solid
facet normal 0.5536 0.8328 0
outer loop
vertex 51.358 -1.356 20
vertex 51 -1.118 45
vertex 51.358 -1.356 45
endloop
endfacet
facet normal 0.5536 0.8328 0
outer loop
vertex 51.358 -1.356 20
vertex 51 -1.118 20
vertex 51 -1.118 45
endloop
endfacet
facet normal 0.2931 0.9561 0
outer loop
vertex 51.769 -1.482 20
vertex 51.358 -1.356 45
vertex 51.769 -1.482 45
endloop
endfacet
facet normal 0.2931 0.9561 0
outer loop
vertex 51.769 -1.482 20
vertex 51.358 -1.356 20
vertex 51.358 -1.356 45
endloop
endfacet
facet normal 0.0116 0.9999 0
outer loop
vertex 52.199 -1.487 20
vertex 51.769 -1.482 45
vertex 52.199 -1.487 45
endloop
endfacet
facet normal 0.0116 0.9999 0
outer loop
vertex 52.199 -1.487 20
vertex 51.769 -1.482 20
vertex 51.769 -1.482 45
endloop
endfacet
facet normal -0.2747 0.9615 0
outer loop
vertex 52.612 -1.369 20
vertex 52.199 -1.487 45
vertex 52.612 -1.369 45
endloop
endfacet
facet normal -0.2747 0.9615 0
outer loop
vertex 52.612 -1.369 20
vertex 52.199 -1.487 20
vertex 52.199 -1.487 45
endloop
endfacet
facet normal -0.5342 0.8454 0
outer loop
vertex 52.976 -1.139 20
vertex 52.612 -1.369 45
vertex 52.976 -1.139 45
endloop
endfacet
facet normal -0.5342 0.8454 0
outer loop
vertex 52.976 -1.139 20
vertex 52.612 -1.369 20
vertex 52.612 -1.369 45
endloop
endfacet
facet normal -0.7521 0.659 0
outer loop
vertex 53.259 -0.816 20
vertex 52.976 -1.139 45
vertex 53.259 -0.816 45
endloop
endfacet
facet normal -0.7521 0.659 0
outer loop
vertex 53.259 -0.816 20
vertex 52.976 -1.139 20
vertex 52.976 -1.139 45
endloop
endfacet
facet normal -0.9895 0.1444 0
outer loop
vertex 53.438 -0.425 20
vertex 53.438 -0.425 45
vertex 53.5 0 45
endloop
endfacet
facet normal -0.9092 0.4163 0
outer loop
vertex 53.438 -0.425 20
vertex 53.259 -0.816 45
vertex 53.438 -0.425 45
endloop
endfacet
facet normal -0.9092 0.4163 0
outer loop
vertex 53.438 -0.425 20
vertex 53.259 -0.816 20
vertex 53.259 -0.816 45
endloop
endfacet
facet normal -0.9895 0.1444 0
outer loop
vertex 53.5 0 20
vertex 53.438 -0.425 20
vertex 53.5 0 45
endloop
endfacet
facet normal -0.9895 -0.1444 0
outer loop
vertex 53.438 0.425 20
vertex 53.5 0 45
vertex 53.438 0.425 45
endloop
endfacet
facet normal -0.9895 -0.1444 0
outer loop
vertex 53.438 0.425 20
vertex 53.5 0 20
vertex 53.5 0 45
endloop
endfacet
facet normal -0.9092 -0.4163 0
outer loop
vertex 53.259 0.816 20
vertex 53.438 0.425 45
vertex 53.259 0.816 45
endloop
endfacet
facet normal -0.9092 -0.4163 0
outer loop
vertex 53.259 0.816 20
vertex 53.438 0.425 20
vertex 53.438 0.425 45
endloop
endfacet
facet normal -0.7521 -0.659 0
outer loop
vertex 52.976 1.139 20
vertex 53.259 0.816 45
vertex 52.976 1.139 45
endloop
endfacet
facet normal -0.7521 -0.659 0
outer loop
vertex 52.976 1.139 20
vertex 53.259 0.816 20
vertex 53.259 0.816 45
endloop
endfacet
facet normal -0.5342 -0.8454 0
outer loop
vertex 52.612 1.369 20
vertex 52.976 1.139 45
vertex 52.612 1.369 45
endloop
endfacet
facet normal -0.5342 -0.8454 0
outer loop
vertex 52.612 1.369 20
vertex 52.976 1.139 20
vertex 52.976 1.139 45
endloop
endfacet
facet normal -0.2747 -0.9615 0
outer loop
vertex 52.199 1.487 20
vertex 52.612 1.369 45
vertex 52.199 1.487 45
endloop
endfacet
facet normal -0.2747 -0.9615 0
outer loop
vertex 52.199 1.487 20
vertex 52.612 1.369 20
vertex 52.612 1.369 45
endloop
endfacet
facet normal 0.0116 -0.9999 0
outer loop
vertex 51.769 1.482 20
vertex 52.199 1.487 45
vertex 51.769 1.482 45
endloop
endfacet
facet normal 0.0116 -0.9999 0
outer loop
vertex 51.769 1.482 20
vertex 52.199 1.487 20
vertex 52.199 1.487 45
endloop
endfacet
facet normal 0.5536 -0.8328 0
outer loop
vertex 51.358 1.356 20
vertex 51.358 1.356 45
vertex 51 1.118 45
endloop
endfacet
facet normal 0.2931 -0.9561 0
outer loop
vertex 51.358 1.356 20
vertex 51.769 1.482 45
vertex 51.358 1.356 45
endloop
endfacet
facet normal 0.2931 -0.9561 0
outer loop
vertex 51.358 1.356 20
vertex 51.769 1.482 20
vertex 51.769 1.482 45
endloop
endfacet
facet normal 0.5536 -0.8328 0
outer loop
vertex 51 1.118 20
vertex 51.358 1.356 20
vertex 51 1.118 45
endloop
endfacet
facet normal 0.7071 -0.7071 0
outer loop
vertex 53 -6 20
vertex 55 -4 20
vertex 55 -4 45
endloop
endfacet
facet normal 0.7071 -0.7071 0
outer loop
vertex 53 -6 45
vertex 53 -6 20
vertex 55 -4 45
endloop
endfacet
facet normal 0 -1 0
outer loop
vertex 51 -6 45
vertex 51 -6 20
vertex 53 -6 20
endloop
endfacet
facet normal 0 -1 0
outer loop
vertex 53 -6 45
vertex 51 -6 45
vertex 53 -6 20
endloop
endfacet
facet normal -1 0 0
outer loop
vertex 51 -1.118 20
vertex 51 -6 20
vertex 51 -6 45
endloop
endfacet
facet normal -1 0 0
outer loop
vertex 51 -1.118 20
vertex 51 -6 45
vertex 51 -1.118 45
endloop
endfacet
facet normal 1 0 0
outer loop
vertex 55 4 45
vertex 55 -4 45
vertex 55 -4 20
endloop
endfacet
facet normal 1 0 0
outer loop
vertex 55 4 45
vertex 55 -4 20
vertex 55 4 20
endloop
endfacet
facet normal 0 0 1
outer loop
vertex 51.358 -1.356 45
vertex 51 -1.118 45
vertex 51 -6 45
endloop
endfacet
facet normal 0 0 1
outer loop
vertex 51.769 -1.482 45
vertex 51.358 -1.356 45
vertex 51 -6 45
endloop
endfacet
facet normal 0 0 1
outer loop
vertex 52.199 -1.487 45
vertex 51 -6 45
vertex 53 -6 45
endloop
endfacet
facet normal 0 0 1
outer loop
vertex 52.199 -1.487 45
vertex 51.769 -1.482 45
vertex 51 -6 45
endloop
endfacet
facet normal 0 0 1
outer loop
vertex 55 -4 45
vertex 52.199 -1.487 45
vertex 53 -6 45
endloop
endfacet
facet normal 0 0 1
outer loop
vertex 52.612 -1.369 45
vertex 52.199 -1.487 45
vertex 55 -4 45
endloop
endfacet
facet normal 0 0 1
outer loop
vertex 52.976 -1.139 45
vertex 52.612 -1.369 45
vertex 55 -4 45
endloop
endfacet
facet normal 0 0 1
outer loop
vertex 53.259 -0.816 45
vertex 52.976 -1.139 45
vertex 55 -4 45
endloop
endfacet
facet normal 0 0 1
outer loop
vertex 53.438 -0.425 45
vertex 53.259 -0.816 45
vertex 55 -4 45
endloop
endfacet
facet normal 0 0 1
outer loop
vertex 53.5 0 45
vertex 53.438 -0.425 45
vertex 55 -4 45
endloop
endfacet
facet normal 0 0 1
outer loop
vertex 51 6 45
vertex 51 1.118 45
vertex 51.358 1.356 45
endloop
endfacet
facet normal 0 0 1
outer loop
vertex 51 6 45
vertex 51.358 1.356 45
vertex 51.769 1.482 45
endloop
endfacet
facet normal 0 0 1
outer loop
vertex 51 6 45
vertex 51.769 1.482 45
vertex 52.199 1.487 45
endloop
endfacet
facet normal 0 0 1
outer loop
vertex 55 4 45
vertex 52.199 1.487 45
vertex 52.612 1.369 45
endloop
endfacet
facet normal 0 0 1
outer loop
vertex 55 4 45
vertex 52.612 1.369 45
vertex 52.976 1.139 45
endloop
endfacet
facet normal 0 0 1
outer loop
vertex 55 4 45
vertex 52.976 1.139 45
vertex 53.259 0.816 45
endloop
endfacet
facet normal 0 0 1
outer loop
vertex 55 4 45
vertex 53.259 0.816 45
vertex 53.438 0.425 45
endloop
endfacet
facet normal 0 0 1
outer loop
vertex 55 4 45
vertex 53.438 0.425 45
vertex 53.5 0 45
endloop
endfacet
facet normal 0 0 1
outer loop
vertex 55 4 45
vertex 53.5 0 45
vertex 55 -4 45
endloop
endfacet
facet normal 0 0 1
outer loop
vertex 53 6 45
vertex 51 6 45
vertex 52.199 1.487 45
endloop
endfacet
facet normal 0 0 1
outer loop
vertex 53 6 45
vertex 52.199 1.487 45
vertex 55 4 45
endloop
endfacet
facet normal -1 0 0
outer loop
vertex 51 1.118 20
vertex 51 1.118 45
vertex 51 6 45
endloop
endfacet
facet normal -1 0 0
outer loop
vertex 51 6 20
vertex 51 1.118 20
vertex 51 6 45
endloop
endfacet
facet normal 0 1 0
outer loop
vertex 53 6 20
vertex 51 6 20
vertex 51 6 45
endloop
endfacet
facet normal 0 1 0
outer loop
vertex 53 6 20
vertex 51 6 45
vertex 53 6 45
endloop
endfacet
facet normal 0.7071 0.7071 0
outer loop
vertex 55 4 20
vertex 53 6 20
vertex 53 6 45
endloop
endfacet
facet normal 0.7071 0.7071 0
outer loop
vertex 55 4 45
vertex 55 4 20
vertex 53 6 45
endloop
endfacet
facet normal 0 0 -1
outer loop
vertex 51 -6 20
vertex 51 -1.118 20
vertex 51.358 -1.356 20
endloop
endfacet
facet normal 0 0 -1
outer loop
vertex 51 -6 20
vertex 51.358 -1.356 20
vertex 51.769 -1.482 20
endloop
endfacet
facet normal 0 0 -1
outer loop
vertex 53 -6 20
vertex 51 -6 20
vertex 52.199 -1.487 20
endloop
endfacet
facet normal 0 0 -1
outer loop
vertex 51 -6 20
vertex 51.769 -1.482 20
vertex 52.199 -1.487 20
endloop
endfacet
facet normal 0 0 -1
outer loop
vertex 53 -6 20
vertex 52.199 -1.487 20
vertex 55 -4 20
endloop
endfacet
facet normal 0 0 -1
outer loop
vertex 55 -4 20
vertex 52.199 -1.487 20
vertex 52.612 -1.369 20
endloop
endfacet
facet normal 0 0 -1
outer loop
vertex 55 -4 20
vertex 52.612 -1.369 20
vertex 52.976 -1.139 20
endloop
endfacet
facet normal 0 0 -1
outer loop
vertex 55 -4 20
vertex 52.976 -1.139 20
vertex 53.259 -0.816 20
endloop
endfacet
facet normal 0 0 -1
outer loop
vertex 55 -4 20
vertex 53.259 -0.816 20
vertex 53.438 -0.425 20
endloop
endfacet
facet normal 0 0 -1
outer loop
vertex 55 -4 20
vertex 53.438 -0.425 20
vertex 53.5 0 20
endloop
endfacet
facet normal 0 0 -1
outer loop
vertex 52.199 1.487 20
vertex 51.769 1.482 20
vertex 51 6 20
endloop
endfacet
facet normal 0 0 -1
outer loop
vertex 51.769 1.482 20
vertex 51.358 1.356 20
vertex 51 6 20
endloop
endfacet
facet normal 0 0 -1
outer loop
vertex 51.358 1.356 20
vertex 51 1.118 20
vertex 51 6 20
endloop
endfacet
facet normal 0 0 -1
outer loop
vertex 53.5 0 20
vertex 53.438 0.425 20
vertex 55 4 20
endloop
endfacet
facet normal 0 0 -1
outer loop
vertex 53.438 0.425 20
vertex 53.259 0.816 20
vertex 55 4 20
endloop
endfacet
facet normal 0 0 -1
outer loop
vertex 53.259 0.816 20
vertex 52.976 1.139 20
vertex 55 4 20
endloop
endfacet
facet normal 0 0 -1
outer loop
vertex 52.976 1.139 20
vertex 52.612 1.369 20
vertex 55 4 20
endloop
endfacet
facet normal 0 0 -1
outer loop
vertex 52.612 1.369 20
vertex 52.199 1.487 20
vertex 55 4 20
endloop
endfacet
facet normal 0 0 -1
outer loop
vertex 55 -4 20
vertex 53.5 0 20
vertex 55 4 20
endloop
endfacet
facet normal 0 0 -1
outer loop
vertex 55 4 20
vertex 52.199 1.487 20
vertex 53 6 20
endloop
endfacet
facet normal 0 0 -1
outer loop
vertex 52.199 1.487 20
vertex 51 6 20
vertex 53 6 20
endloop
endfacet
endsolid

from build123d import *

# Parameters (mm, degrees)
CYLINDER1144_R     = 1.5
CYLINDER1144_DEPTH = 50
BOX457_W           = 4
BOX457_H           = 12
BOX457_DEPTH       = 25
CHAMFER_SIZE       = 2


with BuildPart() as v_lec1144:
    # Cylinder1144 → Cylinder1144 (new body)
    with BuildSketch(Plane(origin=(52, 0, 0), x_dir=(1, 0, 0), z_dir=(0, 0, 1))):
        Circle(CYLINDER1144_R)
    extrude(amount=CYLINDER1144_DEPTH)


with BuildPart() as cut428:
    # Box457 → Box457 (new body)
    with BuildSketch(Plane(origin=(51, -6, 20), x_dir=(1, 0, 0), z_dir=(0, 0, 1))):
        with Locations((2, 6)):
            Rectangle(BOX457_W, BOX457_H)
    extrude(amount=BOX457_DEPTH)

    # Chamfer
    chamfer_edges = [cut428.edges().sort_by_distance(p)[0] for p in [
        (55, -6, 32.5),
        (55, 6, 32.5),
    ]]
    chamfer(chamfer_edges, length=CHAMFER_SIZE)

    # Cut428: cut Válec1144
    add(v_lec1144.part, mode=Mode.SUBTRACT)


solid = cut428.part
